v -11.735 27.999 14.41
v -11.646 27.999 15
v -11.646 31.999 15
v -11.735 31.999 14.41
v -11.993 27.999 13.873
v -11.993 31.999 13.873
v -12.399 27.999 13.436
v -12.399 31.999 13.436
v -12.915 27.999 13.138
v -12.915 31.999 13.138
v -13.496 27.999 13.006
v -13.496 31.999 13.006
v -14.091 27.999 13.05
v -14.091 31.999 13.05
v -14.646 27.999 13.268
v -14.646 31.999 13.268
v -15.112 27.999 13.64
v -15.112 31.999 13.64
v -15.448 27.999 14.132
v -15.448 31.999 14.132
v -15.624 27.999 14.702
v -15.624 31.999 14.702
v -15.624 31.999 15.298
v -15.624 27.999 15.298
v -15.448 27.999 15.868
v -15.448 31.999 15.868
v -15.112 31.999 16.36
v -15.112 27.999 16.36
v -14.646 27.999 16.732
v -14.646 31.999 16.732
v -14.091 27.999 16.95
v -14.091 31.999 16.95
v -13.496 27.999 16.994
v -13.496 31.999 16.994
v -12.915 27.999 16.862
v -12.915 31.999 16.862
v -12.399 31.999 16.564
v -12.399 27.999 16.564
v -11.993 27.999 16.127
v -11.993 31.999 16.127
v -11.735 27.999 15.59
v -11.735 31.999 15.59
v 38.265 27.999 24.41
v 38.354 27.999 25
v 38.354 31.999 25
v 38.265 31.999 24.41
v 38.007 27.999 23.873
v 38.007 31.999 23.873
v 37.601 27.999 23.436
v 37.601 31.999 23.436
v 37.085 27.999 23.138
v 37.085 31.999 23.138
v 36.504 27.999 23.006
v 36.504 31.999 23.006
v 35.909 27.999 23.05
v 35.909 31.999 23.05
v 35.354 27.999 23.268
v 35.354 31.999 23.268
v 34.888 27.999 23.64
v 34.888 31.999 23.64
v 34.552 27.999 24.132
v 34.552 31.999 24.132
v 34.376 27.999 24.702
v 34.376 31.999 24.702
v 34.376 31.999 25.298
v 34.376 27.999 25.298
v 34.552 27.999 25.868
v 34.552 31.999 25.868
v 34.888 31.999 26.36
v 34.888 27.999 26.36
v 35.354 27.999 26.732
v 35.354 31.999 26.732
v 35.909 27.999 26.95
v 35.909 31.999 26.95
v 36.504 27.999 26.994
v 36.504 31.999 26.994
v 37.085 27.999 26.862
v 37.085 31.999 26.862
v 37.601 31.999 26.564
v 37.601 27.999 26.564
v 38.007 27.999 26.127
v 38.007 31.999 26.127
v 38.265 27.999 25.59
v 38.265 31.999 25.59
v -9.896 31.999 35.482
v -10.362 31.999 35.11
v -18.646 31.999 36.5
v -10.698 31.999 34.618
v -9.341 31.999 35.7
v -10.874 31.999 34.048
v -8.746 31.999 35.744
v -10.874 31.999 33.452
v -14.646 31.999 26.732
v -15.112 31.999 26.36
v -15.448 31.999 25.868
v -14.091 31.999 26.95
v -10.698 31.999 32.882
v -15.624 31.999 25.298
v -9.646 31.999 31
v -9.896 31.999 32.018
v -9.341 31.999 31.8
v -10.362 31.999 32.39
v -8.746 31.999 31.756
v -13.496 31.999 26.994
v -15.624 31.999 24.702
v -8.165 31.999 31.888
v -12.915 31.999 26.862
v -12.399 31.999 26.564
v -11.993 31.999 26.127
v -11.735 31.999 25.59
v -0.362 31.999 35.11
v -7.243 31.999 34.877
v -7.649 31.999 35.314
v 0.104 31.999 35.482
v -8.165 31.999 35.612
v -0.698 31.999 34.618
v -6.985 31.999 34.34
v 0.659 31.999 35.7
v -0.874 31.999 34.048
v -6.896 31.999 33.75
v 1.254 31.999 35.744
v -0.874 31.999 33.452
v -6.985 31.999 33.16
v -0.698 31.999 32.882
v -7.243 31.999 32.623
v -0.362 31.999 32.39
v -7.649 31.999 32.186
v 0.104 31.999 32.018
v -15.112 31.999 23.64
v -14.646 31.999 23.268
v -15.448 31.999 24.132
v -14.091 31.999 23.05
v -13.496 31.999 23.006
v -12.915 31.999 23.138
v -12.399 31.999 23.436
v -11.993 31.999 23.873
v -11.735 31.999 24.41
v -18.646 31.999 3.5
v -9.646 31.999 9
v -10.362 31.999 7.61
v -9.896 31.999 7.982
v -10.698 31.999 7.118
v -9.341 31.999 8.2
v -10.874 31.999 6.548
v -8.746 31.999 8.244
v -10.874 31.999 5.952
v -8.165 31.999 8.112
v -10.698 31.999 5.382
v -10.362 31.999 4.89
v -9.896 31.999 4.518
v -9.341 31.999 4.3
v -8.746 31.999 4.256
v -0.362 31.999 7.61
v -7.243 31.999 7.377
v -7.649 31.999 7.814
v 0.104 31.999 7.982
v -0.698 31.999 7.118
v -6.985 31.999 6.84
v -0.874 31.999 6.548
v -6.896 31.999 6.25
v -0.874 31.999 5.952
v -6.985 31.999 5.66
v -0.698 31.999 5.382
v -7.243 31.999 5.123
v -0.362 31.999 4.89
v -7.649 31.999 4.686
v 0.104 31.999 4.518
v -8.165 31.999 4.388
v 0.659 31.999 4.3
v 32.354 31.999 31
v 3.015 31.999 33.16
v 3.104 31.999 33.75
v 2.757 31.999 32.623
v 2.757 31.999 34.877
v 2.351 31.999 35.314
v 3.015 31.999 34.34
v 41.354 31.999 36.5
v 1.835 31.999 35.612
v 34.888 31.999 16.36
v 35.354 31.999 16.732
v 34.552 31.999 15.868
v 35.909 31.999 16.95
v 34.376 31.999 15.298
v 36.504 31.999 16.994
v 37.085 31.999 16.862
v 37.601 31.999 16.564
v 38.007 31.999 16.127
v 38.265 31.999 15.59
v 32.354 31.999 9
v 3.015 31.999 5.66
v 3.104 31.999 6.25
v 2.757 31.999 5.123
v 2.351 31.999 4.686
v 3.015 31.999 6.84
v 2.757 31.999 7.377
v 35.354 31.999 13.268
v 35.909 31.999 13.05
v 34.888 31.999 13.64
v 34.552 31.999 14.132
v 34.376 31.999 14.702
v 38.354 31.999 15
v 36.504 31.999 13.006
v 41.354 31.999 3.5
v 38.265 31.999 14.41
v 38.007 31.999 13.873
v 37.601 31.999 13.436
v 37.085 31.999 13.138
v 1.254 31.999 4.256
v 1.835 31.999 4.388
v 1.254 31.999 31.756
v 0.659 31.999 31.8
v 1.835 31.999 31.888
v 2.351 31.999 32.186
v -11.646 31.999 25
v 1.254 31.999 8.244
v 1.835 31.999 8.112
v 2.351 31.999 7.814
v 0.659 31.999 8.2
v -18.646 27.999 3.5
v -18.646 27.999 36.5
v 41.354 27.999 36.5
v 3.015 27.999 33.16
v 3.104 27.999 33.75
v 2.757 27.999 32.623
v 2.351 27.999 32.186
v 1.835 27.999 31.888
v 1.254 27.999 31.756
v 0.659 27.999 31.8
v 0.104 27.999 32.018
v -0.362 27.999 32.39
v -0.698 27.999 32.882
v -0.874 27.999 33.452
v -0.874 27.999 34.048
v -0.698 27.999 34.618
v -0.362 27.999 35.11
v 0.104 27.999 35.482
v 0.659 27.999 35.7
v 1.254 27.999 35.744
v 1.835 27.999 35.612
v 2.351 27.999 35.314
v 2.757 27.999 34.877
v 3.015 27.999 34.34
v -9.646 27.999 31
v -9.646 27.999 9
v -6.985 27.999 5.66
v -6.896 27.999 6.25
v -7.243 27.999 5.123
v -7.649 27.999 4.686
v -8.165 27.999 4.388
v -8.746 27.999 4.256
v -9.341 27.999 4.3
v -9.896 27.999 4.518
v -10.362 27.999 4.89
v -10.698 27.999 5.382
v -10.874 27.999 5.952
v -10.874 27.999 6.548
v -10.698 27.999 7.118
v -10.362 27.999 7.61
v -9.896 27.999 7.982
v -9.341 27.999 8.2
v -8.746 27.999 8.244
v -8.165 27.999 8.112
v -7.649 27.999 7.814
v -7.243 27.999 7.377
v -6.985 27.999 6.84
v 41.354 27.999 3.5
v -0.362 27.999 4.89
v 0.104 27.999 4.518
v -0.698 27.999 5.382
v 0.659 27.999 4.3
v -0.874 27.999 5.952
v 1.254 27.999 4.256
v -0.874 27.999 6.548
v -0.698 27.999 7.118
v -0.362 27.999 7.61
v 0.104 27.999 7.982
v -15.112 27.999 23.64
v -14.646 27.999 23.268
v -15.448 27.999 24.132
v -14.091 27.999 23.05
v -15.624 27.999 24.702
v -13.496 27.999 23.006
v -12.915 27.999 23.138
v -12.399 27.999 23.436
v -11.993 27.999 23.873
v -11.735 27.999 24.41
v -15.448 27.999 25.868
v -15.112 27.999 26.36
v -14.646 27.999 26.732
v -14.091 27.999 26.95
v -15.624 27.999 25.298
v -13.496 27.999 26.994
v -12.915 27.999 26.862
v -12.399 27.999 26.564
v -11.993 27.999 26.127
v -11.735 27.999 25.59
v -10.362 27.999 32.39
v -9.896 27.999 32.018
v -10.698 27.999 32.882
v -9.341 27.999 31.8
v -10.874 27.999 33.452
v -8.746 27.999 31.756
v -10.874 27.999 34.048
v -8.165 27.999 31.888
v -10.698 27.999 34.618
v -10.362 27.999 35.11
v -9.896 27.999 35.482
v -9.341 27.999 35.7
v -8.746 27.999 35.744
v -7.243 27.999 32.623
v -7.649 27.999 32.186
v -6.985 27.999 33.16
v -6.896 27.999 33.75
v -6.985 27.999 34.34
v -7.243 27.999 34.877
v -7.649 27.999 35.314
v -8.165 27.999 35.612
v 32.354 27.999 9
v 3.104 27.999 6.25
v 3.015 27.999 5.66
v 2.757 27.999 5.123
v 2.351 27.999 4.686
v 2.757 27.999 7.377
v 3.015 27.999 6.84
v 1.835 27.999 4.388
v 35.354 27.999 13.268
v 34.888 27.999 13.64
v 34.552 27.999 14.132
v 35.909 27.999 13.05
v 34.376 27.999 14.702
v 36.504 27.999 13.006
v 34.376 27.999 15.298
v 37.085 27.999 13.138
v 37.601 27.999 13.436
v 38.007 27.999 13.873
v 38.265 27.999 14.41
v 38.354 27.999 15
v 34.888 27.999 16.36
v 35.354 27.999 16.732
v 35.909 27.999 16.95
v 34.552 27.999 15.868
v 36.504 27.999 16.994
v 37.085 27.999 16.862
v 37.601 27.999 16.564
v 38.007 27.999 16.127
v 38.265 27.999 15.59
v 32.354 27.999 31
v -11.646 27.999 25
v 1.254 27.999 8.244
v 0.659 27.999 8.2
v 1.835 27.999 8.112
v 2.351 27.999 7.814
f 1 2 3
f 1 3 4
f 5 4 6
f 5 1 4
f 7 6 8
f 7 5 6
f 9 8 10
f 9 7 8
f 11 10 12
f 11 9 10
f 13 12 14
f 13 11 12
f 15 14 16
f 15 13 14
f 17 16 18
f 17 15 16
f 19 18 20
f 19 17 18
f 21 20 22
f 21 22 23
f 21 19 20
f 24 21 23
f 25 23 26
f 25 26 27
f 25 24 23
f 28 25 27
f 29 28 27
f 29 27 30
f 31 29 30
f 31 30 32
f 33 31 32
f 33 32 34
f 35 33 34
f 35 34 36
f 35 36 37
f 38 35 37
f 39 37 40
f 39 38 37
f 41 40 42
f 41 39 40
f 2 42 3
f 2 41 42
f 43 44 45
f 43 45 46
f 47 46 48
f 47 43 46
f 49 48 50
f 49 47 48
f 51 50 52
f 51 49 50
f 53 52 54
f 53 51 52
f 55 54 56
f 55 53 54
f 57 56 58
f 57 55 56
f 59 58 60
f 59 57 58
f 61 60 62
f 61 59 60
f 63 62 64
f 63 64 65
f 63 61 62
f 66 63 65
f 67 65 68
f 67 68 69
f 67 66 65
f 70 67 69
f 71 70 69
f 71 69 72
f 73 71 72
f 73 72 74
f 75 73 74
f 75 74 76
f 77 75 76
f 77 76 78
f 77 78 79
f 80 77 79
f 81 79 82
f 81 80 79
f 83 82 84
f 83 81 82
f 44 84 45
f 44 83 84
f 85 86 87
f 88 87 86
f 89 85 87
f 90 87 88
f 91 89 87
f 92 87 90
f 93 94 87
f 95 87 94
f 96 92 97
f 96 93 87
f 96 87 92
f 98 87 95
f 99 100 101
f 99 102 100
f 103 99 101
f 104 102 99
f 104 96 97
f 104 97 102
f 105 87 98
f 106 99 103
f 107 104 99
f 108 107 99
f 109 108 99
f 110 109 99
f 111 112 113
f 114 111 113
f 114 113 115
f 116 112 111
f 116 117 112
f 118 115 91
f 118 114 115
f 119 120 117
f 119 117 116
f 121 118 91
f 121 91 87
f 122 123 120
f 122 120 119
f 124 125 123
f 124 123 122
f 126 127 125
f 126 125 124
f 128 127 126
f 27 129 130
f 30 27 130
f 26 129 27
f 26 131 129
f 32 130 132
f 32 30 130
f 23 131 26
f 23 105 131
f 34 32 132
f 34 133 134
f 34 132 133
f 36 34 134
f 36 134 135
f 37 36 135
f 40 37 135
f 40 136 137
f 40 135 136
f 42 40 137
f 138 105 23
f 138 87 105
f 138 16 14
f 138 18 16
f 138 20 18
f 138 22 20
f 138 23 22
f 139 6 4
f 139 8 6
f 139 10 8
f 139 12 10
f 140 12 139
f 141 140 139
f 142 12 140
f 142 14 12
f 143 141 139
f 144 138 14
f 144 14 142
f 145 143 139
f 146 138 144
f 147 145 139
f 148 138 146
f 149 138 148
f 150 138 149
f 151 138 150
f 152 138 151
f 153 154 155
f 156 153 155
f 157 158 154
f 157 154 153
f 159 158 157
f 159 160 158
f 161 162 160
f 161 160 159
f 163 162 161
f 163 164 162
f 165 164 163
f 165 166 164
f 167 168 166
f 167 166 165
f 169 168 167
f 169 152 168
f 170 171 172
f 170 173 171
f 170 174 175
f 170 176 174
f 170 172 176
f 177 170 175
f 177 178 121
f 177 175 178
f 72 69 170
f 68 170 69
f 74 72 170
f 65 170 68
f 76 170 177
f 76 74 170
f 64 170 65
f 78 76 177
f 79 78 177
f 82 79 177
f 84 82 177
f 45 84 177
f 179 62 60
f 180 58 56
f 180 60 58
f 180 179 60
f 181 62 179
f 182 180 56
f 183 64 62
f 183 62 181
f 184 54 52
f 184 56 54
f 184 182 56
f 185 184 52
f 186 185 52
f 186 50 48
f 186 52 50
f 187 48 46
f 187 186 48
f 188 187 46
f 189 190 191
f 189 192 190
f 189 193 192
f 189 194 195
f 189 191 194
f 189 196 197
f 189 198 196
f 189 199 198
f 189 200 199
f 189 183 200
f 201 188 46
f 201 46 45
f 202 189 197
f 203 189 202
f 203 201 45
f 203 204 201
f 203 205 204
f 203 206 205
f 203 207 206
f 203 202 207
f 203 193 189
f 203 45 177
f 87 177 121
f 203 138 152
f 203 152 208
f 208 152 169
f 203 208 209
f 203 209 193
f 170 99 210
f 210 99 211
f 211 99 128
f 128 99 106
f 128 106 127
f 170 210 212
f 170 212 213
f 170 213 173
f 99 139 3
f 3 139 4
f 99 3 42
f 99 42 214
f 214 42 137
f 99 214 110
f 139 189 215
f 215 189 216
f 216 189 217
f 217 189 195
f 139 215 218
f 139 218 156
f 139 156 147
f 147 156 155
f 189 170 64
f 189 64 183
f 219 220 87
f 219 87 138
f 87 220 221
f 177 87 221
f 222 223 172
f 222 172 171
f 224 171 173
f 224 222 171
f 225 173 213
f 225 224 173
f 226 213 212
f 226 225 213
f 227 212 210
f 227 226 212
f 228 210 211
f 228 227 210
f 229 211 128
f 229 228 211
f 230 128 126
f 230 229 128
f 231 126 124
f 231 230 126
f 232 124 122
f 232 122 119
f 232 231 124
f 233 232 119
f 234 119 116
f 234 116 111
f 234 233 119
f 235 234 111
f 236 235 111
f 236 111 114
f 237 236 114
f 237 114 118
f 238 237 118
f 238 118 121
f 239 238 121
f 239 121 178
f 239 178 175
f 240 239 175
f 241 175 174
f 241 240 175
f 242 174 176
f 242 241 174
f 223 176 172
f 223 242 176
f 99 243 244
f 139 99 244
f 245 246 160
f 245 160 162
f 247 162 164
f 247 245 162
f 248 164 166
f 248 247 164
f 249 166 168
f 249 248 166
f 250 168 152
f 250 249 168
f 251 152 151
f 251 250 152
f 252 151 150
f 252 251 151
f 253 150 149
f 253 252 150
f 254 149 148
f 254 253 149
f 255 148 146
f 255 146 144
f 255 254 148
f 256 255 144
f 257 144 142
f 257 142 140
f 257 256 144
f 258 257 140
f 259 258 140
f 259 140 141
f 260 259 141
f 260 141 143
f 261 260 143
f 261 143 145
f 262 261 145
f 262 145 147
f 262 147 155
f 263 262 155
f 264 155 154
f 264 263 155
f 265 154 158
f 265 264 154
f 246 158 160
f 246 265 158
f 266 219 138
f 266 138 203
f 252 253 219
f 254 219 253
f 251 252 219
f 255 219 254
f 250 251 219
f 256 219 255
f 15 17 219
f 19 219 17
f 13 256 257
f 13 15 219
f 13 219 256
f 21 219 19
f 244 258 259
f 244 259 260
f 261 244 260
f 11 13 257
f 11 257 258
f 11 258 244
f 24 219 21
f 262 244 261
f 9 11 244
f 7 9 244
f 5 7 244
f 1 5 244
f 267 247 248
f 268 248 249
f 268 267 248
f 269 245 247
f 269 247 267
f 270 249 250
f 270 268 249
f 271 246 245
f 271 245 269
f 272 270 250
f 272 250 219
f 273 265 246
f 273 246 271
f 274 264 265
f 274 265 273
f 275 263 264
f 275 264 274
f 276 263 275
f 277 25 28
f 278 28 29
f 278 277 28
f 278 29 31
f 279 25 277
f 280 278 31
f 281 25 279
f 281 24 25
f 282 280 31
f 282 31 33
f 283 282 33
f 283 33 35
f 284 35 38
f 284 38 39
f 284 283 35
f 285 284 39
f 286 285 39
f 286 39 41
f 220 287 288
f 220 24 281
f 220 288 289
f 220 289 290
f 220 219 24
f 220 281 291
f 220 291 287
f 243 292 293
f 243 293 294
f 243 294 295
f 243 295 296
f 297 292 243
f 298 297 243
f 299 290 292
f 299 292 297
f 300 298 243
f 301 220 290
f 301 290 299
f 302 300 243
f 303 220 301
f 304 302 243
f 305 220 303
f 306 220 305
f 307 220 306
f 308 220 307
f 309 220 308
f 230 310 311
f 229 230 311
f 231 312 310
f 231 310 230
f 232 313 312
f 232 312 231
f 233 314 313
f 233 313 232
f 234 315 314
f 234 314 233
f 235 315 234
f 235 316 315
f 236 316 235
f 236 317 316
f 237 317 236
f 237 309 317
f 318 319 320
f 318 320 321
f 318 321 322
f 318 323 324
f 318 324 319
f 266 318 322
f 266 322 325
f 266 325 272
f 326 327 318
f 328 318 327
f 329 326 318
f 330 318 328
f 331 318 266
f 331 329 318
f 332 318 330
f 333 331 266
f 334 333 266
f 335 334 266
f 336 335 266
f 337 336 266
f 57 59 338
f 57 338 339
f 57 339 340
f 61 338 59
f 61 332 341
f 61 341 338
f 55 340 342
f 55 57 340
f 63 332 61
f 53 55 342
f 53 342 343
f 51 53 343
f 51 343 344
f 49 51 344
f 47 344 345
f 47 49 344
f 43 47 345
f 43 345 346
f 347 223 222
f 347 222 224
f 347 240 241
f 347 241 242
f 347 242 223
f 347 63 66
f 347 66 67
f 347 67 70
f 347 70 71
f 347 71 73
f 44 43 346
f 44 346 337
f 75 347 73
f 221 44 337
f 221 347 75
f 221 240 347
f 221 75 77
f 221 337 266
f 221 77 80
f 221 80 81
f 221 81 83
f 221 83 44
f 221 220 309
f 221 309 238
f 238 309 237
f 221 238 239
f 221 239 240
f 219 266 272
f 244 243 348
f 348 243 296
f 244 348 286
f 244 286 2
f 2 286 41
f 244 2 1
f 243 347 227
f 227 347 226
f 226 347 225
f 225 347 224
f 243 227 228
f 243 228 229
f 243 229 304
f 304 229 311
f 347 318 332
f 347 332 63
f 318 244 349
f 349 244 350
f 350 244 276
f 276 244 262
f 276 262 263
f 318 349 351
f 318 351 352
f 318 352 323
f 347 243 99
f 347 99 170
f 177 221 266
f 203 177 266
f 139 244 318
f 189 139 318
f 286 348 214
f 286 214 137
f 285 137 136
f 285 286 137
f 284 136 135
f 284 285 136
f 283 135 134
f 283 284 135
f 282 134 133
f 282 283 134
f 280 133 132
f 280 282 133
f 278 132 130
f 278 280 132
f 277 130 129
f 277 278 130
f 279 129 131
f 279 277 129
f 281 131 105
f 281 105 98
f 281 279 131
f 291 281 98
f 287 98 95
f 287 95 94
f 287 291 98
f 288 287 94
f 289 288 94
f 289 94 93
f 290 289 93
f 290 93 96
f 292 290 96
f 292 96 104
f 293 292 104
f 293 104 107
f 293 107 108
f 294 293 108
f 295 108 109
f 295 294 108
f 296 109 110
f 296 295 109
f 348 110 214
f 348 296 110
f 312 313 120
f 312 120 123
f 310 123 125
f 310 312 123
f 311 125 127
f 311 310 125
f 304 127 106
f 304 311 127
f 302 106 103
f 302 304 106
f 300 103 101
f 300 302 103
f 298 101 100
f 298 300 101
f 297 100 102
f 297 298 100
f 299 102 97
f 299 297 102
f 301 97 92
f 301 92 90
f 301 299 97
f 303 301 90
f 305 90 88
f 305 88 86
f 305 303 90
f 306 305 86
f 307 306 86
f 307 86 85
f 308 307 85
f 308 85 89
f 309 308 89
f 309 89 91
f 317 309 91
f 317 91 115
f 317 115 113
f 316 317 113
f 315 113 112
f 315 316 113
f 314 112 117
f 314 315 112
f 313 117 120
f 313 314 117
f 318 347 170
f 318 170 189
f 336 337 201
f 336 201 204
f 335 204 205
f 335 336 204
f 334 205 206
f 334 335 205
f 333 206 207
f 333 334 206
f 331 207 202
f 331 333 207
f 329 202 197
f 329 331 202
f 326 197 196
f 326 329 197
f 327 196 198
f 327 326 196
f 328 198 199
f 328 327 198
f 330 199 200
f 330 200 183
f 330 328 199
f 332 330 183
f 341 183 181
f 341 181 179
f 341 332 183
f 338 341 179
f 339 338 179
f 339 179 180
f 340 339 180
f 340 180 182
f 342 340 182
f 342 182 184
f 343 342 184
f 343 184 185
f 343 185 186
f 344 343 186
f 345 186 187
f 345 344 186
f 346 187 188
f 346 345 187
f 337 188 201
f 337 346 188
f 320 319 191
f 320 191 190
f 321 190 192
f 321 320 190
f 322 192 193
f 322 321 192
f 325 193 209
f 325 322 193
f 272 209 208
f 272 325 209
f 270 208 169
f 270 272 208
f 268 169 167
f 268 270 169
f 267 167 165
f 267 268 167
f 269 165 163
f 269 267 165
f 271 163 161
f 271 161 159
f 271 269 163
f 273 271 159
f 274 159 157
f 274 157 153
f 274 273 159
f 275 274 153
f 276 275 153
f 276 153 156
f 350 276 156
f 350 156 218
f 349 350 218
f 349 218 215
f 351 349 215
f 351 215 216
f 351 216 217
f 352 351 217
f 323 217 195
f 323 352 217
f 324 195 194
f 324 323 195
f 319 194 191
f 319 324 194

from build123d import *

# Parameters (mm, degrees)
SALIENTE_EXTRUIR1_DEPTH = 40
CROQUIS3_R              = 2.5
CORTAR_EXTRUIR1_DEPTH   = 94
CROQUIS5_W              = 40
CROQUIS5_H              = 10
CORTAR_EXTRUIR2_DEPTH   = 40
CROQUIS6_W              = 42
CROQUIS6_H              = 22
CORTAR_EXTRUIR3_DEPTH   = 10
CROQUIS7_R              = 2
CORTAR_EXTRUIR4_DEPTH   = 10
CROQUIS8_W              = 60
CROQUIS8_H              = 33
CROQUIS8_R              = 2
CROQUIS8_W_2            = 42
CROQUIS8_H_2            = 22
SALIENTE_EXTRUIR2_DEPTH = 4
CROQUIS9_W              = 99.924242424
CROQUIS9_H              = 56.811688312
CORTAR_EXTRUIR9_DEPTH   = 41


with BuildPart() as part:
    # Croquis2 → Saliente-Extruir1 (new body)
    with BuildSketch(Plane.XY):
        Polygon((-31.145916957, -11.001243781), (-31.145916957, 23.998756219), (53.854083043, 23.998756219), (53.854083043, -11.001243781), (57.854083043, -11.001243781), (57.854083043, 27.998756219), (-35.145916957, 27.998756219), (-35.145916957, -11.001243781), align=None)
    extrude(amount=SALIENTE_EXTRUIR1_DEPTH)

    # Croquis3 → Cortar-Extruir1 (cut, through all)
    with BuildSketch(Plane.ZY.offset(35.145916957)):
        with Locations((20, 7.998756219)):
            Circle(CROQUIS3_R)
    extrude(amount=-CORTAR_EXTRUIR1_DEPTH, mode=Mode.SUBTRACT)

    # Croquis5 → Cortar-Extruir2 (cut)
    with BuildSketch(Plane.ZY.offset(35.145916957)):
        with Locations((20, -6.001243781)):
            Rectangle(CROQUIS5_W, CROQUIS5_H)
    extrude(amount=-CORTAR_EXTRUIR2_DEPTH, mode=Mode.SUBTRACT)

    # Croquis6 → Cortar-Extruir3 (cut)
    with BuildSketch(Plane(origin=(0, 27.998756219, 0), x_dir=(1, 0, 0), z_dir=(0, 1, 0))):
        with Locations((11.354083043, -20)):
            Rectangle(CROQUIS6_W, CROQUIS6_H)
    extrude(amount=-CORTAR_EXTRUIR3_DEPTH, mode=Mode.SUBTRACT)

    # Croquis7 → Cortar-Extruir4 (cut)
    with BuildSketch(Plane(origin=(0, 27.998756219, 0), x_dir=(1, 0, 0), z_dir=(0, 1, 0))):
        with Locations((-13.645916957, -15)):
            Circle(CROQUIS7_R)
        with Locations((-13.645916957, -25)):
            Circle(CROQUIS7_R)
        with Locations((36.354083043, -15)):
            Circle(CROQUIS7_R)
        with Locations((36.354083043, -25)):
            Circle(CROQUIS7_R)
    extrude(amount=-CORTAR_EXTRUIR4_DEPTH, mode=Mode.SUBTRACT)

    # Croquis8 → Saliente-Extruir2 (add)
    with BuildSketch(Plane(origin=(0, 27.998756219, 0), x_dir=(1, 0, 0), z_dir=(0, 1, 0))):
        with Locations((11.354083043, -20)):
            Rectangle(CROQUIS8_W, CROQUIS8_H)
        with Locations((-8.895916957, -6.25)):
            Circle(CROQUIS8_R, mode=Mode.SUBTRACT)
        with Locations((1.104083043, -6.25)):
            Circle(CROQUIS8_R, mode=Mode.SUBTRACT)
        with Locations((-8.895916957, -33.75)):
            Circle(CROQUIS8_R, mode=Mode.SUBTRACT)
        with Locations((1.104083043, -33.75)):
            Circle(CROQUIS8_R, mode=Mode.SUBTRACT)
        with Locations((-13.645916957, -15)):
            Circle(CROQUIS8_R, mode=Mode.SUBTRACT)
        with Locations((-13.645916957, -25)):
            Circle(CROQUIS8_R, mode=Mode.SUBTRACT)
        with Locations((36.354083043, -15)):
            Circle(CROQUIS8_R, mode=Mode.SUBTRACT)
        with Locations((36.354083043, -25)):
            Circle(CROQUIS8_R, mode=Mode.SUBTRACT)
        with Locations((11.354083043, -20)):
            Rectangle(CROQUIS8_W_2, CROQUIS8_H_2, mode=Mode.SUBTRACT)
    extrude(amount=SALIENTE_EXTRUIR2_DEPTH)

    # Croquis9 → Cortar-Extruir9 (cut, through all)
    with BuildSketch(Plane.XY.offset(40)):
        with Locations((14.816204255, -0.407087937)):
            Rectangle(CROQUIS9_W, CROQUIS9_H)
    extrude(amount=-CORTAR_EXTRUIR9_DEPTH, mode=Mode.SUBTRACT)


solid = part.part
